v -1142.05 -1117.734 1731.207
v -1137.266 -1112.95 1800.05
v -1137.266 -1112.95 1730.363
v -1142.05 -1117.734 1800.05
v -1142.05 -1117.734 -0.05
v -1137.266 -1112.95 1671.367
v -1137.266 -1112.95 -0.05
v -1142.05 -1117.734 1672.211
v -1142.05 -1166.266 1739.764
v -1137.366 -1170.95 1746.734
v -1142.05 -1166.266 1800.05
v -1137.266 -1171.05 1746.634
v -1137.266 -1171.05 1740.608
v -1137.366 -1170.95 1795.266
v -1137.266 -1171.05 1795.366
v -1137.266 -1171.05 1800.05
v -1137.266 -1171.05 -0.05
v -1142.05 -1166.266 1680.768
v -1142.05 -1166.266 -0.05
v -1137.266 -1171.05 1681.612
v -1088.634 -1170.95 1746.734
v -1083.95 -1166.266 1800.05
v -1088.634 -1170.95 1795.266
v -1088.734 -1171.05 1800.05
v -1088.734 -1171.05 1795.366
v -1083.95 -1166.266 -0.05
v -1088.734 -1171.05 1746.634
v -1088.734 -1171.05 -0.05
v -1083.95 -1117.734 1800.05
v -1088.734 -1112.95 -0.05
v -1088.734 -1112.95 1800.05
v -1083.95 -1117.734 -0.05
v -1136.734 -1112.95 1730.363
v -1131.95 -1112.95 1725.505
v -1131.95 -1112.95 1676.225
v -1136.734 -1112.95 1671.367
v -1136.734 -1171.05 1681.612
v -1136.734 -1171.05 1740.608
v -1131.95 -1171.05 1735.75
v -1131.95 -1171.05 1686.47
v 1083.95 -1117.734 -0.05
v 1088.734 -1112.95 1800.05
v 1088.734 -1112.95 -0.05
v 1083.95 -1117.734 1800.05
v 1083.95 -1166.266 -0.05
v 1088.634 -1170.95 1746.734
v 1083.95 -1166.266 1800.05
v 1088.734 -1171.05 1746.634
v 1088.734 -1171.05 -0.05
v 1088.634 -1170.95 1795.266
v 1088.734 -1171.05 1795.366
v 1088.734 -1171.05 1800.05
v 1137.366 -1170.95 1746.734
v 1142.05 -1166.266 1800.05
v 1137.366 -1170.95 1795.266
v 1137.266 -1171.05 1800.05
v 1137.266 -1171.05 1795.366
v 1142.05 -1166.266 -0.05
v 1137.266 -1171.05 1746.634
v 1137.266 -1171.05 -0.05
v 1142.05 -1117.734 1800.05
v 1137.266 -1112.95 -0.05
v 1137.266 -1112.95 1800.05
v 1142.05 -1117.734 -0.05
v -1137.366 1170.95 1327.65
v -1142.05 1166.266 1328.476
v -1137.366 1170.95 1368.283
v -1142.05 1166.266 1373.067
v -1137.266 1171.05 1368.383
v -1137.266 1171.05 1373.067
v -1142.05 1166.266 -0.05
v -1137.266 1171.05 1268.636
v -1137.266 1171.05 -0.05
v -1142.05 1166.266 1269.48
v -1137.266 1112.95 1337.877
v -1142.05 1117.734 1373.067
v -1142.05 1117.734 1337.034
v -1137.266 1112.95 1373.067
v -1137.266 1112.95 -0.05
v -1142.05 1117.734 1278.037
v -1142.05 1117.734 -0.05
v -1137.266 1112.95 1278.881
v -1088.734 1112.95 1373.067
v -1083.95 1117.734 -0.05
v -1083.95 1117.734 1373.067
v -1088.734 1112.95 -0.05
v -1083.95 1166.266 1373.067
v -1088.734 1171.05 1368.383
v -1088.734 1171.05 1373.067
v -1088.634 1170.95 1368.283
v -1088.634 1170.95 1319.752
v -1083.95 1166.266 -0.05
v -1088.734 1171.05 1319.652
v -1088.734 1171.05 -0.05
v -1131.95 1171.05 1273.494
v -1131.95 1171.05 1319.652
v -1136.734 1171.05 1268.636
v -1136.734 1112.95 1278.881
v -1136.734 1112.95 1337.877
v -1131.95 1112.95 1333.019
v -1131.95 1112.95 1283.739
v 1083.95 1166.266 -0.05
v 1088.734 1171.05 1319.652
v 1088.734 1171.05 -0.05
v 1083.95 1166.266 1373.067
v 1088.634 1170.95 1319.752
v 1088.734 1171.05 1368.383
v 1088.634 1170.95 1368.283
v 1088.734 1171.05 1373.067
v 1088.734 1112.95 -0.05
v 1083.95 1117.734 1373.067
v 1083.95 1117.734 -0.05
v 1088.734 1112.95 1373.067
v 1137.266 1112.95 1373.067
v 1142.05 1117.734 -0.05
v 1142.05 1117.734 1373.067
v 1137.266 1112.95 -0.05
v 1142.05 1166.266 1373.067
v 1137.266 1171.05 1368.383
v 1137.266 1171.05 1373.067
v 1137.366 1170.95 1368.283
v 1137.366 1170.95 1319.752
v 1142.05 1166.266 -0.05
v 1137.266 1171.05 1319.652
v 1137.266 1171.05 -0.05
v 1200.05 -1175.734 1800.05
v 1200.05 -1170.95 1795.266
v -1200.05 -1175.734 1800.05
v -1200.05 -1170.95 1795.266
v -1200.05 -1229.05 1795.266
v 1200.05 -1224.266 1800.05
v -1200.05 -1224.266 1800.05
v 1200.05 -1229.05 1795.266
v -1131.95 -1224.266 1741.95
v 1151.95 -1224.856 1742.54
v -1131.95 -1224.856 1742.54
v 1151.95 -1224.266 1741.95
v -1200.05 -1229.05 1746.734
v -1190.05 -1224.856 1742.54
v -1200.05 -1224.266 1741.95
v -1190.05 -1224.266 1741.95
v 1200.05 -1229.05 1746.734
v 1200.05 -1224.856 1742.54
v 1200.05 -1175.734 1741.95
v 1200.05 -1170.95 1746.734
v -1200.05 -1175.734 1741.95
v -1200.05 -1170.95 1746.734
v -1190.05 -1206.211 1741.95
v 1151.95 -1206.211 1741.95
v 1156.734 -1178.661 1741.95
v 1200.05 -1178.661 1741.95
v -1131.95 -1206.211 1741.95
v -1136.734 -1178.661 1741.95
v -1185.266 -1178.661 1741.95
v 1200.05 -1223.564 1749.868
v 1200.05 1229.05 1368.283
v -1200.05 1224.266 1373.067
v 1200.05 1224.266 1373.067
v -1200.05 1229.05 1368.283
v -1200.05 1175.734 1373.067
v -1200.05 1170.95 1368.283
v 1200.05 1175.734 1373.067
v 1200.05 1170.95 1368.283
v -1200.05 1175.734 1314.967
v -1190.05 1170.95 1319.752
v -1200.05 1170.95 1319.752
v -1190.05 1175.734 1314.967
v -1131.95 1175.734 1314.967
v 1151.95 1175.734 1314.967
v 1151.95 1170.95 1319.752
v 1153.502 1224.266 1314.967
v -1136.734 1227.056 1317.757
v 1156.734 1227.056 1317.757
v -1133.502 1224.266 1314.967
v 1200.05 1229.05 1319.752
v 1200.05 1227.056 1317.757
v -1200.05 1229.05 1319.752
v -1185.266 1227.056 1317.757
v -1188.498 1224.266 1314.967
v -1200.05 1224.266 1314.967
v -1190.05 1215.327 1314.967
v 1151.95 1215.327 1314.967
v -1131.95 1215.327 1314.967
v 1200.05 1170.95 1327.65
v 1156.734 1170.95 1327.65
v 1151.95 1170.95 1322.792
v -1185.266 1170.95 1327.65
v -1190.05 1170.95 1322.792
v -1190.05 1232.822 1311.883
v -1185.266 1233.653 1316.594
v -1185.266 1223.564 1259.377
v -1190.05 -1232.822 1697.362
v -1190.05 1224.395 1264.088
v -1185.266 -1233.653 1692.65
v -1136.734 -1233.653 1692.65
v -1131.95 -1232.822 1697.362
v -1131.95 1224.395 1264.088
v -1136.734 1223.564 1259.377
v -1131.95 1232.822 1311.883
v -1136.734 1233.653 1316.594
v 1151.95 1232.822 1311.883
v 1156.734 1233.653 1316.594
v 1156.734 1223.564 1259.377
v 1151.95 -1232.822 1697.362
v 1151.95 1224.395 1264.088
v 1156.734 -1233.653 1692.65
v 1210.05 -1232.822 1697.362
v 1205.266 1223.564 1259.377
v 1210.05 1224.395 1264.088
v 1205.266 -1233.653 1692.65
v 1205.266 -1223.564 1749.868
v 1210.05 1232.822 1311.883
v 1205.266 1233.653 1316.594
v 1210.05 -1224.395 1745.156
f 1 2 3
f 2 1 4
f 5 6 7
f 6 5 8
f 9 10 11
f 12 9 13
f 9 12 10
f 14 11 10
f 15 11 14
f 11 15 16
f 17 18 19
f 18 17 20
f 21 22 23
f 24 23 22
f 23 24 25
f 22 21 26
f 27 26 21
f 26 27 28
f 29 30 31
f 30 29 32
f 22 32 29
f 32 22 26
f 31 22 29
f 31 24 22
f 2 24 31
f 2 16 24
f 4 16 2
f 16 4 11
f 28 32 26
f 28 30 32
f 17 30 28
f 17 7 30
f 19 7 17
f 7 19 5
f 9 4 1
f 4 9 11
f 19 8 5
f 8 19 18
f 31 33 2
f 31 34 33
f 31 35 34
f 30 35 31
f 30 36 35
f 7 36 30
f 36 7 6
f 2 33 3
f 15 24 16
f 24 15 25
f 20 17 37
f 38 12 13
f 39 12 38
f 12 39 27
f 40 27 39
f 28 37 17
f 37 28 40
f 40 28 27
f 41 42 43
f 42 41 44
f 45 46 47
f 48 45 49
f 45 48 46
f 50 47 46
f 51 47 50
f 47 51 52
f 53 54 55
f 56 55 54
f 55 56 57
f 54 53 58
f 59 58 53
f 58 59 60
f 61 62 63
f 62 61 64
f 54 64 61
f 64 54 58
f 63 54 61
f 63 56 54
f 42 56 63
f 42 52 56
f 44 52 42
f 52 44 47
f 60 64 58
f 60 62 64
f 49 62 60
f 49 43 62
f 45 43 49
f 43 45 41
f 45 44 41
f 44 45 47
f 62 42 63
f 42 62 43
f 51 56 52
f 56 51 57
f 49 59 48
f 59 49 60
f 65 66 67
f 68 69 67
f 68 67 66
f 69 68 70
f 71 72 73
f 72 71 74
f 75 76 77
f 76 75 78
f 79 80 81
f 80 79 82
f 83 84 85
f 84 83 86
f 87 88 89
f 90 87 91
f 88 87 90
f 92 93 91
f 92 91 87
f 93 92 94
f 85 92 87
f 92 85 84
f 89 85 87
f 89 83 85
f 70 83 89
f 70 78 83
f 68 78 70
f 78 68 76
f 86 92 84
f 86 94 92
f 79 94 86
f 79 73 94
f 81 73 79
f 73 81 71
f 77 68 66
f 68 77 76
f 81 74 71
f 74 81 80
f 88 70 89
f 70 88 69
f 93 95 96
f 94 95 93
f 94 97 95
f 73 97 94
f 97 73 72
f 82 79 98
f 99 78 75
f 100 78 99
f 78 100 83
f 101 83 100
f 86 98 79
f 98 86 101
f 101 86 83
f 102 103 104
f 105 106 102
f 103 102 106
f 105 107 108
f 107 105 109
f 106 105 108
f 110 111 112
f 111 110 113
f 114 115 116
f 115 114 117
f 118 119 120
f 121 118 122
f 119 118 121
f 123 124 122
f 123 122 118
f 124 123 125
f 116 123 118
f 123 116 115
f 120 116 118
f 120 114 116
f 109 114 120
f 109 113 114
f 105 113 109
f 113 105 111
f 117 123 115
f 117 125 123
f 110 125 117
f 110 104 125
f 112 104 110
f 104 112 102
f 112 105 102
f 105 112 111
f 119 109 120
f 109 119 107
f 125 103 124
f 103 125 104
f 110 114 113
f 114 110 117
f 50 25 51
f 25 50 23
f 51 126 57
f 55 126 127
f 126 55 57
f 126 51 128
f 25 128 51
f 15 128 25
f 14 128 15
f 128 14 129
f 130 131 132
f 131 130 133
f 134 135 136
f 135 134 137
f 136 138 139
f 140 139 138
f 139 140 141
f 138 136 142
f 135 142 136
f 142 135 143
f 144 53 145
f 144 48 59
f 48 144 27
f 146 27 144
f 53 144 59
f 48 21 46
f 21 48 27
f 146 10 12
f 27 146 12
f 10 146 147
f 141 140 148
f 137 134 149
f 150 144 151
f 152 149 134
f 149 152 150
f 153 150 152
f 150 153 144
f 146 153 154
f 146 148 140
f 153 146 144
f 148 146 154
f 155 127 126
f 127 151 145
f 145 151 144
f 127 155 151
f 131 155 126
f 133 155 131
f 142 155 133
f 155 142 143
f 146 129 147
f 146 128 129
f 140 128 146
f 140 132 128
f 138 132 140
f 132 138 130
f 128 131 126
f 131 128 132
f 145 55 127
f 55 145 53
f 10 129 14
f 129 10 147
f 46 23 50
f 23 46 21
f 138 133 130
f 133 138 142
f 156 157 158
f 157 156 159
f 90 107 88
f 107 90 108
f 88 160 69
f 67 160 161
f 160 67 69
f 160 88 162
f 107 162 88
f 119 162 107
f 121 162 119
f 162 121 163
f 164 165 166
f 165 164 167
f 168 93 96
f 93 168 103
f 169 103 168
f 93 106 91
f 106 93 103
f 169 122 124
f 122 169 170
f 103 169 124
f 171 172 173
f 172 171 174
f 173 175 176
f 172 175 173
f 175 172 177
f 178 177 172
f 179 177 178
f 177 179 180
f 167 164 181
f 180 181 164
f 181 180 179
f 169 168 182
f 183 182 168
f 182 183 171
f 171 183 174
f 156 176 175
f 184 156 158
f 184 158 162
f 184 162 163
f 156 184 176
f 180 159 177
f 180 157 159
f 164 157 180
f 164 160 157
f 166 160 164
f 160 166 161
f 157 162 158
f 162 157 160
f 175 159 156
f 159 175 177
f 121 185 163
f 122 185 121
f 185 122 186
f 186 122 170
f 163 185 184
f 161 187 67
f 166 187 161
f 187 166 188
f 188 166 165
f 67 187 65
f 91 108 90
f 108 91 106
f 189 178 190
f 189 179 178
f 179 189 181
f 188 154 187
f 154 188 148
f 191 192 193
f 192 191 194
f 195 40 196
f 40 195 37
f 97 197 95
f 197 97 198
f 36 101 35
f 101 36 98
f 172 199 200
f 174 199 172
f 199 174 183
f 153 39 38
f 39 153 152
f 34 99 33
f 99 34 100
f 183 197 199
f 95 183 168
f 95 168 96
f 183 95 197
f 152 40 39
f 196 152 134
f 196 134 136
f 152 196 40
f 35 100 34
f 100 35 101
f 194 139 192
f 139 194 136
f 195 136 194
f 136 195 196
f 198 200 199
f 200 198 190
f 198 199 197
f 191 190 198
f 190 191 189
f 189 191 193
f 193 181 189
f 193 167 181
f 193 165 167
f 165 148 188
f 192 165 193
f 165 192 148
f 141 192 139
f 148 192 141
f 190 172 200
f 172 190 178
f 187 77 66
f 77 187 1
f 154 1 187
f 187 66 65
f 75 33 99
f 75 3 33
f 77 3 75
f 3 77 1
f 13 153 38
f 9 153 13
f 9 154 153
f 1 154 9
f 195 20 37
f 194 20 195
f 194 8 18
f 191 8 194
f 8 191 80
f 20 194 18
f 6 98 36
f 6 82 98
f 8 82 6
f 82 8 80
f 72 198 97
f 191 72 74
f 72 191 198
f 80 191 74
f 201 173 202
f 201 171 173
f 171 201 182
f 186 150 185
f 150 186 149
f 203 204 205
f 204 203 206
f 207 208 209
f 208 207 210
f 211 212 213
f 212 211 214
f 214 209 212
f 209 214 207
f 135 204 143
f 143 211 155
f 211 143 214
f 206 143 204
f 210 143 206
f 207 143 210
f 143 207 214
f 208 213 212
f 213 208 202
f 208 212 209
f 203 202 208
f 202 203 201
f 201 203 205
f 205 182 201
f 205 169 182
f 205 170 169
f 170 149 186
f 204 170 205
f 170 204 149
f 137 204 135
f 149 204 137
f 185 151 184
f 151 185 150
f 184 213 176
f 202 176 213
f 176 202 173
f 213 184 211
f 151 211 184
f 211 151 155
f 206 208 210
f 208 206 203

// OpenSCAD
// Tomatenhaus

SLANT = 10; // Dachneigung

DIM_X = 2400;
DIM_Y = 2400;
DIM_Z = 1800;


BEAM_X = 58;
FAZE = 1.15;

q = .1;


module beam(l=0) {
    difference() {
        cube(size=[BEAM_X+q, BEAM_X+q, l+q], center=true);
        for (r=[0+45, 90+45, 180+45, 270+45])     
        rotate([0, 0, r])
            translate([0, BEAM_X*FAZE, 0]) 
                cube(size=[BEAM_X, BEAM_X, l+(10*q)], center=true);
        
    }
}

// Z
translate([-(DIM_X-3*BEAM_X)/2, -(DIM_Y/2-BEAM_X), DIM_Z/2]) 
    beam(DIM_Z);
translate([(DIM_X-3*BEAM_X)/2, -(DIM_Y/2-BEAM_X), DIM_Z/2]) 
    beam(DIM_Z);
translate([-(DIM_X-3*BEAM_X)/2, (DIM_Y/2-BEAM_X), (DIM_Z-(DIM_Y*sin(SLANT))-(BEAM_X*tan(SLANT)))/2]) 
    beam(DIM_Z-(DIM_Y*sin(SLANT))-(BEAM_X*tan(SLANT)));
translate([(DIM_X-3*BEAM_X)/2, (DIM_Y/2-BEAM_X), (DIM_Z-(DIM_Y*sin(SLANT))-(BEAM_X*tan(SLANT)))/2]) 
    beam(DIM_Z-(DIM_Y*sin(SLANT))-(BEAM_X*tan(SLANT)));

// X
translate([0, -DIM_Y/2, DIM_Z-BEAM_X/2]) 
    rotate([0, 90, 0]) 
        beam(DIM_X);
translate([0, DIM_Y/2, DIM_Z-(DIM_Y*sin(SLANT))-(BEAM_X*tan(SLANT))-BEAM_X/2]) 
    rotate([0, 90, 0]) 
        beam(DIM_X);

// Y
translate([-(DIM_X-BEAM_X)/2+10, 0, DIM_Z-(DIM_Y*sin(SLANT)/2)-BEAM_X*1.5]) 
    rotate([90-SLANT, 0, 0]) 
        beam(DIM_Y/cos(SLANT)+BEAM_X);
translate([(DIM_X-BEAM_X)/2+10, 0, DIM_Z-(DIM_Y*sin(SLANT)/2)-BEAM_X*1.5]) 
    rotate([90-SLANT, 0, 0]) 
        beam(DIM_Y/cos(SLANT)+BEAM_X);
echo("beam length Y", DIM_Y/cos(SLANT));
